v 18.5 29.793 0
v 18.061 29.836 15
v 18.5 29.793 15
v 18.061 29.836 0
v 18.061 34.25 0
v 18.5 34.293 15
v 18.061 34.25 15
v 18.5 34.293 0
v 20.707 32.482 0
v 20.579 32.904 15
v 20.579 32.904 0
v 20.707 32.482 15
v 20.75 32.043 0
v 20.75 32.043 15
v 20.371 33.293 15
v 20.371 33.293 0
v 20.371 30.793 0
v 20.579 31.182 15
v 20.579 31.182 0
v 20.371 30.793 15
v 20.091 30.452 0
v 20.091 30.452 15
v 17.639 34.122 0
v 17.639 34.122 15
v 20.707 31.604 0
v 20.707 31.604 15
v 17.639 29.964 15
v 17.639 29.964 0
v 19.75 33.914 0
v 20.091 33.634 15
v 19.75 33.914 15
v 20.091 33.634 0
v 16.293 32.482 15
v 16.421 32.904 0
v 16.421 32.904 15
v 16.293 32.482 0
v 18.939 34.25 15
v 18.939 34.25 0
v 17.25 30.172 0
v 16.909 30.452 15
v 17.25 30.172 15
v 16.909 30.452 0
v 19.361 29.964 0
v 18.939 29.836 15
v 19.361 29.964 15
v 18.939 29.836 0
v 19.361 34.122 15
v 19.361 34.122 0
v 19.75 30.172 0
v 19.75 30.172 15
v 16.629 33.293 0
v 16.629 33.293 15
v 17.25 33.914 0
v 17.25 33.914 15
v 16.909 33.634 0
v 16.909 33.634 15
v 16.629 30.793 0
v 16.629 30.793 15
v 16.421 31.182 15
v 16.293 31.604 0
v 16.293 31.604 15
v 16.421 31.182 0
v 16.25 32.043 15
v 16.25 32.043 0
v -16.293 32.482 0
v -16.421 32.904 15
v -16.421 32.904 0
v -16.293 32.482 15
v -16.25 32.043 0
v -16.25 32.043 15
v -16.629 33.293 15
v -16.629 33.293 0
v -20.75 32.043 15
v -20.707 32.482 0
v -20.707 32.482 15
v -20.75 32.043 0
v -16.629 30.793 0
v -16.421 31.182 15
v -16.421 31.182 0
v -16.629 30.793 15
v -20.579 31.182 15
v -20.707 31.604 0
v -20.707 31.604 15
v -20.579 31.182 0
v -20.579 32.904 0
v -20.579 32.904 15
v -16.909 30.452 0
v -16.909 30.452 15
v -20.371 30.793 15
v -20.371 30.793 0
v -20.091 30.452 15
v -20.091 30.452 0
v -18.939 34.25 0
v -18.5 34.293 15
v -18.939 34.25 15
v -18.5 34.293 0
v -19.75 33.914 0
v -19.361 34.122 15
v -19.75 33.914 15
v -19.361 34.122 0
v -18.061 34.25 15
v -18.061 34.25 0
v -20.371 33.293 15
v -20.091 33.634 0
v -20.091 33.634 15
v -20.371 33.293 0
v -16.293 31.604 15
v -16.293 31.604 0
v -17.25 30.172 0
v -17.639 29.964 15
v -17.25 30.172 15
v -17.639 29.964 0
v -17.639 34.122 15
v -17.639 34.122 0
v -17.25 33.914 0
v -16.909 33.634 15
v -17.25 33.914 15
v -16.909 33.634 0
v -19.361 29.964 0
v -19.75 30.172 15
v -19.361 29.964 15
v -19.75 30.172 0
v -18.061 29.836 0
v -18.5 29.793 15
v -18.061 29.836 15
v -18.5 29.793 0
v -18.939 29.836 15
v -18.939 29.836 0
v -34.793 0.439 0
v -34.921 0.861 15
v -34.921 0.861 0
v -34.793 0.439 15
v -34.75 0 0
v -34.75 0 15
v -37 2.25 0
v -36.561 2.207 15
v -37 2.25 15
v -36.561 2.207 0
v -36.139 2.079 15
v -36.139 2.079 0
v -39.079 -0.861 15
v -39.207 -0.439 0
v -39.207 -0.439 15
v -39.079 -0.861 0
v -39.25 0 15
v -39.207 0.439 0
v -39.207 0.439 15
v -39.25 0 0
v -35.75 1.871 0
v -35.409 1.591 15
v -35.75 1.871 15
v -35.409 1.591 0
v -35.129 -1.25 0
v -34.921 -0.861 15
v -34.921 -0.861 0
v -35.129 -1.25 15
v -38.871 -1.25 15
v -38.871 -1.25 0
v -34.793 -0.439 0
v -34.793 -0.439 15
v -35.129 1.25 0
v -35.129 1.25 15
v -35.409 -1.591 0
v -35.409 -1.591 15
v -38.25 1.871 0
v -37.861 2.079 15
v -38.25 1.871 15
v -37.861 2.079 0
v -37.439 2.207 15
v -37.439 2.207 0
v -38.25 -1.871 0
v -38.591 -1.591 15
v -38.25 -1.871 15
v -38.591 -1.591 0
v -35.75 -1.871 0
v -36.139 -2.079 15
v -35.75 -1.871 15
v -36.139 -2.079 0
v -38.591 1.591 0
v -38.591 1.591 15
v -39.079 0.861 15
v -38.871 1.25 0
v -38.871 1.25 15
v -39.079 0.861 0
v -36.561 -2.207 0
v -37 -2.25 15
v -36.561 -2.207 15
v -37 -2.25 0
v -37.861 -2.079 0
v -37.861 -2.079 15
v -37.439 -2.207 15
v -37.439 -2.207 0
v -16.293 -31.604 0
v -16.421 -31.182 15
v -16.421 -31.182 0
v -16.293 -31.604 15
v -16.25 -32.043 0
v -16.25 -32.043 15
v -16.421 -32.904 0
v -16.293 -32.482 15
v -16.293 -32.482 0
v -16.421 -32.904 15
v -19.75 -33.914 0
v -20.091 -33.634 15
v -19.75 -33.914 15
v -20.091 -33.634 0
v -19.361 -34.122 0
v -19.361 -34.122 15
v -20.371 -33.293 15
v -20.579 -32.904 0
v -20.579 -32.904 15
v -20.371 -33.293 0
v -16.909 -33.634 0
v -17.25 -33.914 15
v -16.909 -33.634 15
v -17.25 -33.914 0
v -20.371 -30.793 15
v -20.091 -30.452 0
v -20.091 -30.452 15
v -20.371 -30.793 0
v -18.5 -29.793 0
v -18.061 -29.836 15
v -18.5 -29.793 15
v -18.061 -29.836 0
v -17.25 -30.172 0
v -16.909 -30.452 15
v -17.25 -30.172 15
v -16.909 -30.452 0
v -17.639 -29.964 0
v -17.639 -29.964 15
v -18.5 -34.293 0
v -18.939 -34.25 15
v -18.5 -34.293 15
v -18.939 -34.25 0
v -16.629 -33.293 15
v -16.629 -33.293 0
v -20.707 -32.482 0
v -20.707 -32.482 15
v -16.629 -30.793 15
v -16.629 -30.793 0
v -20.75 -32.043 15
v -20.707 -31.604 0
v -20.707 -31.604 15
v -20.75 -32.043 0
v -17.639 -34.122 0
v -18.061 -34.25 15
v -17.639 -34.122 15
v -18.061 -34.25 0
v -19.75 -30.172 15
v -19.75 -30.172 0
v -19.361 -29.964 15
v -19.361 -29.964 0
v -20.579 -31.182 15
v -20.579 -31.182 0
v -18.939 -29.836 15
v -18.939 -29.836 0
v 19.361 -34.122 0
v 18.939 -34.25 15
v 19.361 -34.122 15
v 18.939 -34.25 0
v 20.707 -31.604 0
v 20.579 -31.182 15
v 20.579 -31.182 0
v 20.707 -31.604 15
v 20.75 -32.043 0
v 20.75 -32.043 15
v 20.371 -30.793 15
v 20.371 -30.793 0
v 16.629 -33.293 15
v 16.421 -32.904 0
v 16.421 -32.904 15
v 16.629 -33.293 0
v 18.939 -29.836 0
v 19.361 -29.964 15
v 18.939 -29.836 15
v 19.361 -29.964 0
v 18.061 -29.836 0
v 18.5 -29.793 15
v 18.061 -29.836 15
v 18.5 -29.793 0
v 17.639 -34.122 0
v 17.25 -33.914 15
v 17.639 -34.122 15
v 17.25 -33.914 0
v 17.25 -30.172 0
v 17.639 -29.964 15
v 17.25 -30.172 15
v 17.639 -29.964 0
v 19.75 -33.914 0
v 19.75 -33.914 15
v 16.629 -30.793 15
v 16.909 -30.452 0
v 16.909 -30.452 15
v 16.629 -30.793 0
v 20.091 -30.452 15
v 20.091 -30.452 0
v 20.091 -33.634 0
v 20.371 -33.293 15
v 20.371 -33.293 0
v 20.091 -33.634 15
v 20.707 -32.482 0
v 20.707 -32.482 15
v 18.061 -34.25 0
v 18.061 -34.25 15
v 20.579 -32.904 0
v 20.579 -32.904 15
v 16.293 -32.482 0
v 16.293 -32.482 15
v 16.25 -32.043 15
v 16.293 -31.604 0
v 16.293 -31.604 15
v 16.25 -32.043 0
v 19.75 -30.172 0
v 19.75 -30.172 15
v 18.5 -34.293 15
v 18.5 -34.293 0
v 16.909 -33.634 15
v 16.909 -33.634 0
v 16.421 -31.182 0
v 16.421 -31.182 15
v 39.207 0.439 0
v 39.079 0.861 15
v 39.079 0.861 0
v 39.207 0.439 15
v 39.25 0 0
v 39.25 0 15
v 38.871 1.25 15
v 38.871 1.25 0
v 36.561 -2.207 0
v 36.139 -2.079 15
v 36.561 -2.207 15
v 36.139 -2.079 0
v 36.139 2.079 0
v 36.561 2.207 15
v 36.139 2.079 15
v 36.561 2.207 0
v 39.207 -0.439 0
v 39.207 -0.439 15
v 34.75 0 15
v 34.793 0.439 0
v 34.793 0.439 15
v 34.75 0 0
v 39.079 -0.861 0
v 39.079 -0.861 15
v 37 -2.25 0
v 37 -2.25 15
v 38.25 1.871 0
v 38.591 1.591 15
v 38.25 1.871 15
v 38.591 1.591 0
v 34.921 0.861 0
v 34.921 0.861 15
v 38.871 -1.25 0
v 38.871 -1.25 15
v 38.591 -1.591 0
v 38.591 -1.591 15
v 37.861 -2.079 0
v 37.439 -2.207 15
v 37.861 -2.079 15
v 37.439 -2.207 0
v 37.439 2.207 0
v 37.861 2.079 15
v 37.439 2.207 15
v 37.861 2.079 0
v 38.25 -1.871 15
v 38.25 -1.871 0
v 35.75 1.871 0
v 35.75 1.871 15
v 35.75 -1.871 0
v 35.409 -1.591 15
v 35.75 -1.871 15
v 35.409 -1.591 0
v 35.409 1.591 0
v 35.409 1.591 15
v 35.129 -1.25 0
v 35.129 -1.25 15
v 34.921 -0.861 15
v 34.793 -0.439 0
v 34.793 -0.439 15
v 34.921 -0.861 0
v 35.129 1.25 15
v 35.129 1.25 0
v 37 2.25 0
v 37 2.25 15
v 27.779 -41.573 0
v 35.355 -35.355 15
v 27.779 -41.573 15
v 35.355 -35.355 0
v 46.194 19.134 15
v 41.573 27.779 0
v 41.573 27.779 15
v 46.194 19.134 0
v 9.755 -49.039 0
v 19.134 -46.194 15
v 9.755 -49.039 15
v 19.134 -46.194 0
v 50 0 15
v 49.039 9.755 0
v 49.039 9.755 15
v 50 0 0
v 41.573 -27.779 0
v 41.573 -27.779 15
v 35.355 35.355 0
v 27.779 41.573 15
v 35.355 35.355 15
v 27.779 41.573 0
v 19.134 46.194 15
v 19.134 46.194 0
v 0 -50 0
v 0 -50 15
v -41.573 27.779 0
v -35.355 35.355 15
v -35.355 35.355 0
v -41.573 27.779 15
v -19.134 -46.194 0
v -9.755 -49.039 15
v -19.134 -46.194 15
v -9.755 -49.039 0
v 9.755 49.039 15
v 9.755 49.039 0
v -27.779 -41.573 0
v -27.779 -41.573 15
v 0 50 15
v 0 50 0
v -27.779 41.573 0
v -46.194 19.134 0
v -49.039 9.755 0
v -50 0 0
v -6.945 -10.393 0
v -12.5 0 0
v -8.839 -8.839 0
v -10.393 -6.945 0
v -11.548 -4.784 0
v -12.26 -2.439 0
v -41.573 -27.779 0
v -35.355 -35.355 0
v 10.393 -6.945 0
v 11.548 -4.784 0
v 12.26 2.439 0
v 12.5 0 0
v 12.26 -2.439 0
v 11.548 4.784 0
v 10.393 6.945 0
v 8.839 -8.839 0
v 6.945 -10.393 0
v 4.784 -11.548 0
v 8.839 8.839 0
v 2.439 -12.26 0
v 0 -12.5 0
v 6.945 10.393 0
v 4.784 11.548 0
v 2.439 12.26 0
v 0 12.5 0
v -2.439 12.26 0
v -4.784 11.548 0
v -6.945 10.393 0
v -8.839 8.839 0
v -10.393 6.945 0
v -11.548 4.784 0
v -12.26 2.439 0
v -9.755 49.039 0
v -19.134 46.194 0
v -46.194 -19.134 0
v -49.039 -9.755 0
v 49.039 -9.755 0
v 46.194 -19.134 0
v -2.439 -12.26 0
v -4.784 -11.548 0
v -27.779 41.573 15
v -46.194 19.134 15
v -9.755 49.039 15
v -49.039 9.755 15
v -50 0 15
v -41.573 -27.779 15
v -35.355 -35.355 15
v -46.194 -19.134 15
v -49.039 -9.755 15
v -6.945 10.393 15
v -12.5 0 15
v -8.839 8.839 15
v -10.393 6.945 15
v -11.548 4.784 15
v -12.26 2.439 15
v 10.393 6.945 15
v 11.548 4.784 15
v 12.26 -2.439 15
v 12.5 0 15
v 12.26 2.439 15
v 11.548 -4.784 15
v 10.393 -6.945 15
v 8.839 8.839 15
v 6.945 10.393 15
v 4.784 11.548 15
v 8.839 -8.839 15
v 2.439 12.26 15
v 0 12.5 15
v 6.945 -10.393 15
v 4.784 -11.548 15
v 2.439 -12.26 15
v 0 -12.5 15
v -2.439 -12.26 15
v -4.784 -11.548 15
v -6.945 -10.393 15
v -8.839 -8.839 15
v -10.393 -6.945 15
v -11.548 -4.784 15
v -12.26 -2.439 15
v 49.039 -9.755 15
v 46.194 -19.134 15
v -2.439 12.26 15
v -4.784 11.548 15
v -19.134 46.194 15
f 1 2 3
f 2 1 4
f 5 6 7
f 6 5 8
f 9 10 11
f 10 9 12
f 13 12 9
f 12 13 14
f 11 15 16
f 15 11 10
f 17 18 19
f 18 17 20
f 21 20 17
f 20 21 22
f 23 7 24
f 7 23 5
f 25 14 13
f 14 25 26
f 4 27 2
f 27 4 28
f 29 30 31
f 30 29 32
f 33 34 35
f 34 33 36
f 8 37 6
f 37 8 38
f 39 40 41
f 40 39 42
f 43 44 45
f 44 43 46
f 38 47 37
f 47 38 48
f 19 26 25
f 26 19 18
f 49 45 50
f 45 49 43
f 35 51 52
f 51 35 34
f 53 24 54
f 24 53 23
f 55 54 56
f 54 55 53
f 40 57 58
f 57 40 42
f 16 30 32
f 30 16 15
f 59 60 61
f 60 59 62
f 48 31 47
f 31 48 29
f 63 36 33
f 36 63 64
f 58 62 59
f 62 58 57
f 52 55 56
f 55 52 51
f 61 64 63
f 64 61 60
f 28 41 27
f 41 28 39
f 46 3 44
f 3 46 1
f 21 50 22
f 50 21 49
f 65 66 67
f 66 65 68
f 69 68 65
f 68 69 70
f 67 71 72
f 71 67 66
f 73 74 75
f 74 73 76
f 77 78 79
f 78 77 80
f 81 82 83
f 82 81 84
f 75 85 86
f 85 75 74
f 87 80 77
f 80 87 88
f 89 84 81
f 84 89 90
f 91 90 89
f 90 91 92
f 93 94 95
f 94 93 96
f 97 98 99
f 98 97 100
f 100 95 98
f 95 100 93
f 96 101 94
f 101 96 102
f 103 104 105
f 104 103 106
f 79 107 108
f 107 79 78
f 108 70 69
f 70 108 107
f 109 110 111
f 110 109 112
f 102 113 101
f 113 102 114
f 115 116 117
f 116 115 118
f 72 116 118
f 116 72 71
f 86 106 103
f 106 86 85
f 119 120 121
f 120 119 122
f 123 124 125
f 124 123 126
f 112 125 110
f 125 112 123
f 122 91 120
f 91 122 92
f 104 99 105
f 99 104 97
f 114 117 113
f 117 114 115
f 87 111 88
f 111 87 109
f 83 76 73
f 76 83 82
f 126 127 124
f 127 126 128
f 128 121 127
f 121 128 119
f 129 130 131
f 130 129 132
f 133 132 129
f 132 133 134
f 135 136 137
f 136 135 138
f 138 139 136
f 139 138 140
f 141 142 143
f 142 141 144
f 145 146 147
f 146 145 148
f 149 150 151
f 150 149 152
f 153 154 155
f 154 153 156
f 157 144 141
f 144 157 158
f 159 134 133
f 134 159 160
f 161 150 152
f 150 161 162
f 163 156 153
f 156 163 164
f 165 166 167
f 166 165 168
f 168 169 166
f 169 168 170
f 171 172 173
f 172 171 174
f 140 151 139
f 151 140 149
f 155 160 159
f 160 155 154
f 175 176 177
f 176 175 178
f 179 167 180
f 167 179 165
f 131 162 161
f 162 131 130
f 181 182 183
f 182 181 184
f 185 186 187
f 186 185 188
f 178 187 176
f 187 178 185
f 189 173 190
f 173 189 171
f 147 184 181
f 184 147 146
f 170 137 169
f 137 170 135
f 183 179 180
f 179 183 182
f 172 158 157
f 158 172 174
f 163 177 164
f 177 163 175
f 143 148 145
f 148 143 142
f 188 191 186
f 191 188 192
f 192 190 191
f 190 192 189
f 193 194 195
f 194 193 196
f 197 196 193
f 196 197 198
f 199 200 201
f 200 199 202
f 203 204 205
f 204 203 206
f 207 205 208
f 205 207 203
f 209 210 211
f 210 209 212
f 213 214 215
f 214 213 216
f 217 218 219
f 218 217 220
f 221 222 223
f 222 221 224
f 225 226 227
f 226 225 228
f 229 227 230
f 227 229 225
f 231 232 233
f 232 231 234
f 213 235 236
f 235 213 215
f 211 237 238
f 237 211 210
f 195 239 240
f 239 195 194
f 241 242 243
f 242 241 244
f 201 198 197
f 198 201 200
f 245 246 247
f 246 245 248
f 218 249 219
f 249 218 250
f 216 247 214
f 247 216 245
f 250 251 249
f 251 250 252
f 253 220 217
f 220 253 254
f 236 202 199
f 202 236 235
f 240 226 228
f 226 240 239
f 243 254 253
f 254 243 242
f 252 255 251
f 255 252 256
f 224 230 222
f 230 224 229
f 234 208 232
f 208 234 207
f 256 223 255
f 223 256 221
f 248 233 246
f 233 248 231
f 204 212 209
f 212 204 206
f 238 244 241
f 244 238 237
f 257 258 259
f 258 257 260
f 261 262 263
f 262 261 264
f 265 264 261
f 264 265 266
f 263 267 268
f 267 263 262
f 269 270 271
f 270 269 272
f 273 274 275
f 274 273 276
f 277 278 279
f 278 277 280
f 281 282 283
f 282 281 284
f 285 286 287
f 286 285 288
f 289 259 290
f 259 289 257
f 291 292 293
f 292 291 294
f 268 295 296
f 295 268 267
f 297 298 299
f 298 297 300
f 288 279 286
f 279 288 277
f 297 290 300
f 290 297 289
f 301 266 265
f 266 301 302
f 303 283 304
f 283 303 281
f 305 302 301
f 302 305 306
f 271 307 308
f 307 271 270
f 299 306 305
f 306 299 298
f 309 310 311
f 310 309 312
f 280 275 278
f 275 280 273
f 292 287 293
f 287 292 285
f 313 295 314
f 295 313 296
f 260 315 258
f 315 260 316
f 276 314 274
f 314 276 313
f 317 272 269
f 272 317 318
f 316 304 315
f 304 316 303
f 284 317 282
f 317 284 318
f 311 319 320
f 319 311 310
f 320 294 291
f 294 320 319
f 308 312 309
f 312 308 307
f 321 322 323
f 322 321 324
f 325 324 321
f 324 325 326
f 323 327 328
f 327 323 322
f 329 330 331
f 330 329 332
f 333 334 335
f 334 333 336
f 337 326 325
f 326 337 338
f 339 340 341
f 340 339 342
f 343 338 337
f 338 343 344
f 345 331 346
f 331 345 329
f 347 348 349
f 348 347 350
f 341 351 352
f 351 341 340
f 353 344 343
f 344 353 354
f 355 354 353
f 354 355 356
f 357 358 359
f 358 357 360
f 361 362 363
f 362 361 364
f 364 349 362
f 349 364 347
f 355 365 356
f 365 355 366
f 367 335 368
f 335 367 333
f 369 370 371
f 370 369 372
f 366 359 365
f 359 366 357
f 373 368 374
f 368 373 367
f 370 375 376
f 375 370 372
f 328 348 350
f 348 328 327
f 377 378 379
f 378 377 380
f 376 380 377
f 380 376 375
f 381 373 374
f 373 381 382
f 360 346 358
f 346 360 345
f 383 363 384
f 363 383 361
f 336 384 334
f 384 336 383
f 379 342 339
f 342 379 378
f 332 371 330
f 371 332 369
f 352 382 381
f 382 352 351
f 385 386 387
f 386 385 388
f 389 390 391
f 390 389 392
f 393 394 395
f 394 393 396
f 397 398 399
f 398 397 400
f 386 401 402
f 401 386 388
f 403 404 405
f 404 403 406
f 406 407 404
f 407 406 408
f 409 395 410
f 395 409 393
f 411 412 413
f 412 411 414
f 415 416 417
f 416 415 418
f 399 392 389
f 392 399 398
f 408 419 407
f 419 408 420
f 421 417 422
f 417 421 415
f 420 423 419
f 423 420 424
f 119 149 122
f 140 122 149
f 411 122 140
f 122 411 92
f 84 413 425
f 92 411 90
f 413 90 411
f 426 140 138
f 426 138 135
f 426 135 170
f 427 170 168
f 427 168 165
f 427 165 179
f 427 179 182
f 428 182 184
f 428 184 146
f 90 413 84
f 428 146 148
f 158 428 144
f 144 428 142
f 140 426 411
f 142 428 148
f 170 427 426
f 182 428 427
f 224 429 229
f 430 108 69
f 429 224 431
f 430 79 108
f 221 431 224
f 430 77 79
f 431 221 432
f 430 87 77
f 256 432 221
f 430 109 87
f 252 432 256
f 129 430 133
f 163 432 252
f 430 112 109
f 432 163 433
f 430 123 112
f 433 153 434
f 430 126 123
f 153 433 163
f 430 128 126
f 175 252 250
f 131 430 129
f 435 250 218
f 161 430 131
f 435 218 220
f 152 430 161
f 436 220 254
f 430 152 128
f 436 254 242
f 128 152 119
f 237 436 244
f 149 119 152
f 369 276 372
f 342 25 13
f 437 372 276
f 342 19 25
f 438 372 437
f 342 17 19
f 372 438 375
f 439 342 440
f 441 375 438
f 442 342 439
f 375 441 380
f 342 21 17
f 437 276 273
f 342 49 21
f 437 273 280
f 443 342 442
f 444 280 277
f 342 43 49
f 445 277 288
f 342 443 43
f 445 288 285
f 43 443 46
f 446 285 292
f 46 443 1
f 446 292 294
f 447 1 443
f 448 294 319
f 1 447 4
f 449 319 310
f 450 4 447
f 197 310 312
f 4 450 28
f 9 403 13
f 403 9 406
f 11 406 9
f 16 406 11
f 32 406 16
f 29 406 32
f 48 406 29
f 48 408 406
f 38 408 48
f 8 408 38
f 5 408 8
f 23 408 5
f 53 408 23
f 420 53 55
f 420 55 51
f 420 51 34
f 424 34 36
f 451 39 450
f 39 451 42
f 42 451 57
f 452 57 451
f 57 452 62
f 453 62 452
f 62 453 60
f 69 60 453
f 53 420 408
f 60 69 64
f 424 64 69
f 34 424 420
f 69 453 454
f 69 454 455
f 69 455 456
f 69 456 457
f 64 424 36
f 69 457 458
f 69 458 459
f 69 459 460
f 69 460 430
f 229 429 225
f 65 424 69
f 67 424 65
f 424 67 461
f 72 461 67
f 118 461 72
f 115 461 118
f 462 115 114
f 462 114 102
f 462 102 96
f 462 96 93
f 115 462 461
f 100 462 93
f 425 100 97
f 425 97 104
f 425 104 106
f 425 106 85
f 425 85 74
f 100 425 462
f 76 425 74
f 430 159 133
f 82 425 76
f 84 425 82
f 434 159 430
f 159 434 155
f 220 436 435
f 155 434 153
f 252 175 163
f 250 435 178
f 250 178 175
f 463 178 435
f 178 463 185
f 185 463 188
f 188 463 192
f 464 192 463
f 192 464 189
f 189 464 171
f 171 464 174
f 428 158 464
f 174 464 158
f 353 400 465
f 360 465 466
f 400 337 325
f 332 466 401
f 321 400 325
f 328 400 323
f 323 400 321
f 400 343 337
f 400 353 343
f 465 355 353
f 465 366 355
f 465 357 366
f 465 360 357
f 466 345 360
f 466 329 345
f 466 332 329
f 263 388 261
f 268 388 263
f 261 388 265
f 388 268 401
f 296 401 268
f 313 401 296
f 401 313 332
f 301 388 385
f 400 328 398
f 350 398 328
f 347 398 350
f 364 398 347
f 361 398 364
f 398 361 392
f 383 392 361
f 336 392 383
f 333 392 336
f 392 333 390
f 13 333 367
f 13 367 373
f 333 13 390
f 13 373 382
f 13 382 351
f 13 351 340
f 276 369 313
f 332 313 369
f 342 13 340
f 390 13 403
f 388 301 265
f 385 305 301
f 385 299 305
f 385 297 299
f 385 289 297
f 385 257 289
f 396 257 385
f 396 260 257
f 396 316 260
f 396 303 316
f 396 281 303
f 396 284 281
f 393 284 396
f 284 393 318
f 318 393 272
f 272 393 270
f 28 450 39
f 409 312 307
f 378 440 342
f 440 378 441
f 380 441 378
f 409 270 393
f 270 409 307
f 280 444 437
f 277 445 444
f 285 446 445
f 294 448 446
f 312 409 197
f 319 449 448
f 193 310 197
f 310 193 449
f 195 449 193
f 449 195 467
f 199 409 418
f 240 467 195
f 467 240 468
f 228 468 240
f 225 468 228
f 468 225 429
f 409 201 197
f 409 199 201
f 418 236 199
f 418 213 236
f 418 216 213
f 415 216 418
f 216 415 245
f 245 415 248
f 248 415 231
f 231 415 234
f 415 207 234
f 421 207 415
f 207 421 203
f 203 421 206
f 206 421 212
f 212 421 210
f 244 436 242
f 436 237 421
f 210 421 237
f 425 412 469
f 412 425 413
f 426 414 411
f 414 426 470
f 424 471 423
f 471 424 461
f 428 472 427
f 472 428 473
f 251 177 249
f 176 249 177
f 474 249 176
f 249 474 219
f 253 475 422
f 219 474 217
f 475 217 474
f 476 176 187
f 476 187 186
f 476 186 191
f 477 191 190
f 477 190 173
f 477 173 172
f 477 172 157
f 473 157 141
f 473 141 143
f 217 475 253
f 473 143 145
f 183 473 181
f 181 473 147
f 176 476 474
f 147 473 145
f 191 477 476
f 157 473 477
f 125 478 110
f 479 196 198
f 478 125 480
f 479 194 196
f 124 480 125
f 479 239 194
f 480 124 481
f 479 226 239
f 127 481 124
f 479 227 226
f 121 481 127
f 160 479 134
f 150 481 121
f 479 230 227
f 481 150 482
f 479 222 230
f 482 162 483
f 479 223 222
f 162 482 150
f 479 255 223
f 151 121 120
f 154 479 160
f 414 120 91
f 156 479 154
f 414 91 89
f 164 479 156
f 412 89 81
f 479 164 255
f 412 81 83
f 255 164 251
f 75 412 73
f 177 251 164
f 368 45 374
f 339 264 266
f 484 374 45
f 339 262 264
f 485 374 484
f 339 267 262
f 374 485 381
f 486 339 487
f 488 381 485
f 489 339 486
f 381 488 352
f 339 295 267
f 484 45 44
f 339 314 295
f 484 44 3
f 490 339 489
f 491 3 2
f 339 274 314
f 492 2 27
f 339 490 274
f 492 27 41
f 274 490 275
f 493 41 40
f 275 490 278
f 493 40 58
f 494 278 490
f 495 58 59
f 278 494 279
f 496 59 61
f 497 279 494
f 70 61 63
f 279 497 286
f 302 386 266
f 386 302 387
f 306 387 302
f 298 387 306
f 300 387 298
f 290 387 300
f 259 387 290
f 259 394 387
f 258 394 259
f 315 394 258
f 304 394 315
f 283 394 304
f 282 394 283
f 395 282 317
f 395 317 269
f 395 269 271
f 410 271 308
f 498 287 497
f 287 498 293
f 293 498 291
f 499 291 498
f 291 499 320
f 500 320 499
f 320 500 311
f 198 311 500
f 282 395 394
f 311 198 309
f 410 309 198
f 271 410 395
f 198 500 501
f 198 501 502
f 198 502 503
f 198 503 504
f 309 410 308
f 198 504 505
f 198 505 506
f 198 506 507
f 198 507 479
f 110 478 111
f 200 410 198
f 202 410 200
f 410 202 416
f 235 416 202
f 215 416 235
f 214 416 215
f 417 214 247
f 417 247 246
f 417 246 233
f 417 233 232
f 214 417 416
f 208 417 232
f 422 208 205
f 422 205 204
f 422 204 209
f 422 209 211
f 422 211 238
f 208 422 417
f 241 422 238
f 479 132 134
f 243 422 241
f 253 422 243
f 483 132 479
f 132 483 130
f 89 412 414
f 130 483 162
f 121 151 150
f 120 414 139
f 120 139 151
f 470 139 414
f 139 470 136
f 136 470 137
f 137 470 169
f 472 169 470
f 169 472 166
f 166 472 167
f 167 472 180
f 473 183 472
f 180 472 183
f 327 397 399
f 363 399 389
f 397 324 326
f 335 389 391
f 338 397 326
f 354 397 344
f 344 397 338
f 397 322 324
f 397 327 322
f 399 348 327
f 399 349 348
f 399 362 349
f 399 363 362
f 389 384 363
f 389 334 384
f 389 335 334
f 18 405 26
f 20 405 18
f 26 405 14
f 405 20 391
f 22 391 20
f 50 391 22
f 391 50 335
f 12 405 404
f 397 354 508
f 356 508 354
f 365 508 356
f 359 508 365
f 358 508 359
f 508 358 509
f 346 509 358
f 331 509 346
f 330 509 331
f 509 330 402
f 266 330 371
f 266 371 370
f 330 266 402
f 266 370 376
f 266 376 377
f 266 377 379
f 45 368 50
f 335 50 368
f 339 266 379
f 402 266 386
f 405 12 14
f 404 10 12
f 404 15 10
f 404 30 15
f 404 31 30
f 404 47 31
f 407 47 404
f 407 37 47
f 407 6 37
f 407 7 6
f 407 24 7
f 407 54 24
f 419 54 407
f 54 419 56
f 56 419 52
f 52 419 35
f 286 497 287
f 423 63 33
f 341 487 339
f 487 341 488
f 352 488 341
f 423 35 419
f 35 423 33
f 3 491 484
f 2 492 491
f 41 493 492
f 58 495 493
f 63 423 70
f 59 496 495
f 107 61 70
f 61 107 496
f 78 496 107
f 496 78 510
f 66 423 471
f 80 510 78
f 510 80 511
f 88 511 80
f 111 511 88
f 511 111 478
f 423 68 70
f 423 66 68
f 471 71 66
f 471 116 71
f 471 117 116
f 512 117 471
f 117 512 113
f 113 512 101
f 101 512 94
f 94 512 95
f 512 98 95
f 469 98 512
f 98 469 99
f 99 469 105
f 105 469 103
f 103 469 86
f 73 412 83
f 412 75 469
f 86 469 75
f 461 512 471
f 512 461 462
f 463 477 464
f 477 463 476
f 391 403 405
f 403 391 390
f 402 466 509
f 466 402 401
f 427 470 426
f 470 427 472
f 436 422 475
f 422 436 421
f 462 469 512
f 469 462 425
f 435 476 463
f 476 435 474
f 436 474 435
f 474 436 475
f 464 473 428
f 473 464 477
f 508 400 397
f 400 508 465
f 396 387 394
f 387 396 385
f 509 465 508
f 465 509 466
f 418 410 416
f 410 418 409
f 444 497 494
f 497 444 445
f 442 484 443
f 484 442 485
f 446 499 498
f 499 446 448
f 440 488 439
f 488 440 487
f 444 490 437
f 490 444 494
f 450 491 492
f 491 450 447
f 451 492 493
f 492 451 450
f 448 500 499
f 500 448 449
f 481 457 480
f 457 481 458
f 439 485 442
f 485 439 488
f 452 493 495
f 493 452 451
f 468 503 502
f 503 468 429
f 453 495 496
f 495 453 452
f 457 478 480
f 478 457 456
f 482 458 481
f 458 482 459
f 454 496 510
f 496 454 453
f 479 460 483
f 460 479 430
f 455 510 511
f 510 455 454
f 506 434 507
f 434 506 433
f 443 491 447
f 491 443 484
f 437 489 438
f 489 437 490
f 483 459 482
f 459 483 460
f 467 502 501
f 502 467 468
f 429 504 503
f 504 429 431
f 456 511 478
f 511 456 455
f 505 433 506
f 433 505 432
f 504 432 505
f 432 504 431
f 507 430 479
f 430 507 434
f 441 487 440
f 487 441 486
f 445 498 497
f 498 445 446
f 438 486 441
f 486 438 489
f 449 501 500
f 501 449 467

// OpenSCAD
$fn = 32;

// ----------------------------------------------------------------------
// Flange Ø100 x 15
// 6 holes on a Ø74 bolt circle, bolted joints
// ----------------------------------------------------------------------

// --- parameters (mm) ---
flange_d = 100;  // outside diameter of the flange
thickness = 15;  // flange thickness
holes = 6;       // number of bolt holes
pcd = 74;        // bolt circle diameter
start_deg = 60;  // angle of the first hole, from +X
hole_d = 4.5;    // bolt hole diameter
bore_d = 25;     // central through bore
hub_d = 35;      // hub outside diameter
hub_h = 0;       // hub height above the flange face (0 = no hub)

// --- derived feature positions (mm) ---
height = thickness + hub_h;  // = 15   overall height of the part
pcd_r = pcd / 2;             // = 37   bolt circle radius
hole_step = 360 / holes;     // = 60   angular pitch
feature_centers = [
  [pcd_r * cos(start_deg + 0 * hole_step), pcd_r * sin(start_deg + 0 * hole_step)],
  [pcd_r * cos(start_deg + 1 * hole_step), pcd_r * sin(start_deg + 1 * hole_step)],
  [pcd_r * cos(start_deg + 2 * hole_step), pcd_r * sin(start_deg + 2 * hole_step)],
  [pcd_r * cos(start_deg + 3 * hole_step), pcd_r * sin(start_deg + 3 * hole_step)],
  [pcd_r * cos(start_deg + 4 * hole_step), pcd_r * sin(start_deg + 4 * hole_step)],
  [pcd_r * cos(start_deg + 5 * hole_step), pcd_r * sin(start_deg + 5 * hole_step)]
];   // bolt hole centres on the pitch circle

// flange disc, every hole and the bore cut straight through
difference() {
  union() {
    cylinder(d = flange_d, h = thickness);
  }
  translate([0, 0, -1]) cylinder(d = bore_d, h = height + 2);  // bore, through
  for (centre = feature_centers)
    translate([centre[0], centre[1], -1]) cylinder(d = hole_d, h = thickness + 2);
}
